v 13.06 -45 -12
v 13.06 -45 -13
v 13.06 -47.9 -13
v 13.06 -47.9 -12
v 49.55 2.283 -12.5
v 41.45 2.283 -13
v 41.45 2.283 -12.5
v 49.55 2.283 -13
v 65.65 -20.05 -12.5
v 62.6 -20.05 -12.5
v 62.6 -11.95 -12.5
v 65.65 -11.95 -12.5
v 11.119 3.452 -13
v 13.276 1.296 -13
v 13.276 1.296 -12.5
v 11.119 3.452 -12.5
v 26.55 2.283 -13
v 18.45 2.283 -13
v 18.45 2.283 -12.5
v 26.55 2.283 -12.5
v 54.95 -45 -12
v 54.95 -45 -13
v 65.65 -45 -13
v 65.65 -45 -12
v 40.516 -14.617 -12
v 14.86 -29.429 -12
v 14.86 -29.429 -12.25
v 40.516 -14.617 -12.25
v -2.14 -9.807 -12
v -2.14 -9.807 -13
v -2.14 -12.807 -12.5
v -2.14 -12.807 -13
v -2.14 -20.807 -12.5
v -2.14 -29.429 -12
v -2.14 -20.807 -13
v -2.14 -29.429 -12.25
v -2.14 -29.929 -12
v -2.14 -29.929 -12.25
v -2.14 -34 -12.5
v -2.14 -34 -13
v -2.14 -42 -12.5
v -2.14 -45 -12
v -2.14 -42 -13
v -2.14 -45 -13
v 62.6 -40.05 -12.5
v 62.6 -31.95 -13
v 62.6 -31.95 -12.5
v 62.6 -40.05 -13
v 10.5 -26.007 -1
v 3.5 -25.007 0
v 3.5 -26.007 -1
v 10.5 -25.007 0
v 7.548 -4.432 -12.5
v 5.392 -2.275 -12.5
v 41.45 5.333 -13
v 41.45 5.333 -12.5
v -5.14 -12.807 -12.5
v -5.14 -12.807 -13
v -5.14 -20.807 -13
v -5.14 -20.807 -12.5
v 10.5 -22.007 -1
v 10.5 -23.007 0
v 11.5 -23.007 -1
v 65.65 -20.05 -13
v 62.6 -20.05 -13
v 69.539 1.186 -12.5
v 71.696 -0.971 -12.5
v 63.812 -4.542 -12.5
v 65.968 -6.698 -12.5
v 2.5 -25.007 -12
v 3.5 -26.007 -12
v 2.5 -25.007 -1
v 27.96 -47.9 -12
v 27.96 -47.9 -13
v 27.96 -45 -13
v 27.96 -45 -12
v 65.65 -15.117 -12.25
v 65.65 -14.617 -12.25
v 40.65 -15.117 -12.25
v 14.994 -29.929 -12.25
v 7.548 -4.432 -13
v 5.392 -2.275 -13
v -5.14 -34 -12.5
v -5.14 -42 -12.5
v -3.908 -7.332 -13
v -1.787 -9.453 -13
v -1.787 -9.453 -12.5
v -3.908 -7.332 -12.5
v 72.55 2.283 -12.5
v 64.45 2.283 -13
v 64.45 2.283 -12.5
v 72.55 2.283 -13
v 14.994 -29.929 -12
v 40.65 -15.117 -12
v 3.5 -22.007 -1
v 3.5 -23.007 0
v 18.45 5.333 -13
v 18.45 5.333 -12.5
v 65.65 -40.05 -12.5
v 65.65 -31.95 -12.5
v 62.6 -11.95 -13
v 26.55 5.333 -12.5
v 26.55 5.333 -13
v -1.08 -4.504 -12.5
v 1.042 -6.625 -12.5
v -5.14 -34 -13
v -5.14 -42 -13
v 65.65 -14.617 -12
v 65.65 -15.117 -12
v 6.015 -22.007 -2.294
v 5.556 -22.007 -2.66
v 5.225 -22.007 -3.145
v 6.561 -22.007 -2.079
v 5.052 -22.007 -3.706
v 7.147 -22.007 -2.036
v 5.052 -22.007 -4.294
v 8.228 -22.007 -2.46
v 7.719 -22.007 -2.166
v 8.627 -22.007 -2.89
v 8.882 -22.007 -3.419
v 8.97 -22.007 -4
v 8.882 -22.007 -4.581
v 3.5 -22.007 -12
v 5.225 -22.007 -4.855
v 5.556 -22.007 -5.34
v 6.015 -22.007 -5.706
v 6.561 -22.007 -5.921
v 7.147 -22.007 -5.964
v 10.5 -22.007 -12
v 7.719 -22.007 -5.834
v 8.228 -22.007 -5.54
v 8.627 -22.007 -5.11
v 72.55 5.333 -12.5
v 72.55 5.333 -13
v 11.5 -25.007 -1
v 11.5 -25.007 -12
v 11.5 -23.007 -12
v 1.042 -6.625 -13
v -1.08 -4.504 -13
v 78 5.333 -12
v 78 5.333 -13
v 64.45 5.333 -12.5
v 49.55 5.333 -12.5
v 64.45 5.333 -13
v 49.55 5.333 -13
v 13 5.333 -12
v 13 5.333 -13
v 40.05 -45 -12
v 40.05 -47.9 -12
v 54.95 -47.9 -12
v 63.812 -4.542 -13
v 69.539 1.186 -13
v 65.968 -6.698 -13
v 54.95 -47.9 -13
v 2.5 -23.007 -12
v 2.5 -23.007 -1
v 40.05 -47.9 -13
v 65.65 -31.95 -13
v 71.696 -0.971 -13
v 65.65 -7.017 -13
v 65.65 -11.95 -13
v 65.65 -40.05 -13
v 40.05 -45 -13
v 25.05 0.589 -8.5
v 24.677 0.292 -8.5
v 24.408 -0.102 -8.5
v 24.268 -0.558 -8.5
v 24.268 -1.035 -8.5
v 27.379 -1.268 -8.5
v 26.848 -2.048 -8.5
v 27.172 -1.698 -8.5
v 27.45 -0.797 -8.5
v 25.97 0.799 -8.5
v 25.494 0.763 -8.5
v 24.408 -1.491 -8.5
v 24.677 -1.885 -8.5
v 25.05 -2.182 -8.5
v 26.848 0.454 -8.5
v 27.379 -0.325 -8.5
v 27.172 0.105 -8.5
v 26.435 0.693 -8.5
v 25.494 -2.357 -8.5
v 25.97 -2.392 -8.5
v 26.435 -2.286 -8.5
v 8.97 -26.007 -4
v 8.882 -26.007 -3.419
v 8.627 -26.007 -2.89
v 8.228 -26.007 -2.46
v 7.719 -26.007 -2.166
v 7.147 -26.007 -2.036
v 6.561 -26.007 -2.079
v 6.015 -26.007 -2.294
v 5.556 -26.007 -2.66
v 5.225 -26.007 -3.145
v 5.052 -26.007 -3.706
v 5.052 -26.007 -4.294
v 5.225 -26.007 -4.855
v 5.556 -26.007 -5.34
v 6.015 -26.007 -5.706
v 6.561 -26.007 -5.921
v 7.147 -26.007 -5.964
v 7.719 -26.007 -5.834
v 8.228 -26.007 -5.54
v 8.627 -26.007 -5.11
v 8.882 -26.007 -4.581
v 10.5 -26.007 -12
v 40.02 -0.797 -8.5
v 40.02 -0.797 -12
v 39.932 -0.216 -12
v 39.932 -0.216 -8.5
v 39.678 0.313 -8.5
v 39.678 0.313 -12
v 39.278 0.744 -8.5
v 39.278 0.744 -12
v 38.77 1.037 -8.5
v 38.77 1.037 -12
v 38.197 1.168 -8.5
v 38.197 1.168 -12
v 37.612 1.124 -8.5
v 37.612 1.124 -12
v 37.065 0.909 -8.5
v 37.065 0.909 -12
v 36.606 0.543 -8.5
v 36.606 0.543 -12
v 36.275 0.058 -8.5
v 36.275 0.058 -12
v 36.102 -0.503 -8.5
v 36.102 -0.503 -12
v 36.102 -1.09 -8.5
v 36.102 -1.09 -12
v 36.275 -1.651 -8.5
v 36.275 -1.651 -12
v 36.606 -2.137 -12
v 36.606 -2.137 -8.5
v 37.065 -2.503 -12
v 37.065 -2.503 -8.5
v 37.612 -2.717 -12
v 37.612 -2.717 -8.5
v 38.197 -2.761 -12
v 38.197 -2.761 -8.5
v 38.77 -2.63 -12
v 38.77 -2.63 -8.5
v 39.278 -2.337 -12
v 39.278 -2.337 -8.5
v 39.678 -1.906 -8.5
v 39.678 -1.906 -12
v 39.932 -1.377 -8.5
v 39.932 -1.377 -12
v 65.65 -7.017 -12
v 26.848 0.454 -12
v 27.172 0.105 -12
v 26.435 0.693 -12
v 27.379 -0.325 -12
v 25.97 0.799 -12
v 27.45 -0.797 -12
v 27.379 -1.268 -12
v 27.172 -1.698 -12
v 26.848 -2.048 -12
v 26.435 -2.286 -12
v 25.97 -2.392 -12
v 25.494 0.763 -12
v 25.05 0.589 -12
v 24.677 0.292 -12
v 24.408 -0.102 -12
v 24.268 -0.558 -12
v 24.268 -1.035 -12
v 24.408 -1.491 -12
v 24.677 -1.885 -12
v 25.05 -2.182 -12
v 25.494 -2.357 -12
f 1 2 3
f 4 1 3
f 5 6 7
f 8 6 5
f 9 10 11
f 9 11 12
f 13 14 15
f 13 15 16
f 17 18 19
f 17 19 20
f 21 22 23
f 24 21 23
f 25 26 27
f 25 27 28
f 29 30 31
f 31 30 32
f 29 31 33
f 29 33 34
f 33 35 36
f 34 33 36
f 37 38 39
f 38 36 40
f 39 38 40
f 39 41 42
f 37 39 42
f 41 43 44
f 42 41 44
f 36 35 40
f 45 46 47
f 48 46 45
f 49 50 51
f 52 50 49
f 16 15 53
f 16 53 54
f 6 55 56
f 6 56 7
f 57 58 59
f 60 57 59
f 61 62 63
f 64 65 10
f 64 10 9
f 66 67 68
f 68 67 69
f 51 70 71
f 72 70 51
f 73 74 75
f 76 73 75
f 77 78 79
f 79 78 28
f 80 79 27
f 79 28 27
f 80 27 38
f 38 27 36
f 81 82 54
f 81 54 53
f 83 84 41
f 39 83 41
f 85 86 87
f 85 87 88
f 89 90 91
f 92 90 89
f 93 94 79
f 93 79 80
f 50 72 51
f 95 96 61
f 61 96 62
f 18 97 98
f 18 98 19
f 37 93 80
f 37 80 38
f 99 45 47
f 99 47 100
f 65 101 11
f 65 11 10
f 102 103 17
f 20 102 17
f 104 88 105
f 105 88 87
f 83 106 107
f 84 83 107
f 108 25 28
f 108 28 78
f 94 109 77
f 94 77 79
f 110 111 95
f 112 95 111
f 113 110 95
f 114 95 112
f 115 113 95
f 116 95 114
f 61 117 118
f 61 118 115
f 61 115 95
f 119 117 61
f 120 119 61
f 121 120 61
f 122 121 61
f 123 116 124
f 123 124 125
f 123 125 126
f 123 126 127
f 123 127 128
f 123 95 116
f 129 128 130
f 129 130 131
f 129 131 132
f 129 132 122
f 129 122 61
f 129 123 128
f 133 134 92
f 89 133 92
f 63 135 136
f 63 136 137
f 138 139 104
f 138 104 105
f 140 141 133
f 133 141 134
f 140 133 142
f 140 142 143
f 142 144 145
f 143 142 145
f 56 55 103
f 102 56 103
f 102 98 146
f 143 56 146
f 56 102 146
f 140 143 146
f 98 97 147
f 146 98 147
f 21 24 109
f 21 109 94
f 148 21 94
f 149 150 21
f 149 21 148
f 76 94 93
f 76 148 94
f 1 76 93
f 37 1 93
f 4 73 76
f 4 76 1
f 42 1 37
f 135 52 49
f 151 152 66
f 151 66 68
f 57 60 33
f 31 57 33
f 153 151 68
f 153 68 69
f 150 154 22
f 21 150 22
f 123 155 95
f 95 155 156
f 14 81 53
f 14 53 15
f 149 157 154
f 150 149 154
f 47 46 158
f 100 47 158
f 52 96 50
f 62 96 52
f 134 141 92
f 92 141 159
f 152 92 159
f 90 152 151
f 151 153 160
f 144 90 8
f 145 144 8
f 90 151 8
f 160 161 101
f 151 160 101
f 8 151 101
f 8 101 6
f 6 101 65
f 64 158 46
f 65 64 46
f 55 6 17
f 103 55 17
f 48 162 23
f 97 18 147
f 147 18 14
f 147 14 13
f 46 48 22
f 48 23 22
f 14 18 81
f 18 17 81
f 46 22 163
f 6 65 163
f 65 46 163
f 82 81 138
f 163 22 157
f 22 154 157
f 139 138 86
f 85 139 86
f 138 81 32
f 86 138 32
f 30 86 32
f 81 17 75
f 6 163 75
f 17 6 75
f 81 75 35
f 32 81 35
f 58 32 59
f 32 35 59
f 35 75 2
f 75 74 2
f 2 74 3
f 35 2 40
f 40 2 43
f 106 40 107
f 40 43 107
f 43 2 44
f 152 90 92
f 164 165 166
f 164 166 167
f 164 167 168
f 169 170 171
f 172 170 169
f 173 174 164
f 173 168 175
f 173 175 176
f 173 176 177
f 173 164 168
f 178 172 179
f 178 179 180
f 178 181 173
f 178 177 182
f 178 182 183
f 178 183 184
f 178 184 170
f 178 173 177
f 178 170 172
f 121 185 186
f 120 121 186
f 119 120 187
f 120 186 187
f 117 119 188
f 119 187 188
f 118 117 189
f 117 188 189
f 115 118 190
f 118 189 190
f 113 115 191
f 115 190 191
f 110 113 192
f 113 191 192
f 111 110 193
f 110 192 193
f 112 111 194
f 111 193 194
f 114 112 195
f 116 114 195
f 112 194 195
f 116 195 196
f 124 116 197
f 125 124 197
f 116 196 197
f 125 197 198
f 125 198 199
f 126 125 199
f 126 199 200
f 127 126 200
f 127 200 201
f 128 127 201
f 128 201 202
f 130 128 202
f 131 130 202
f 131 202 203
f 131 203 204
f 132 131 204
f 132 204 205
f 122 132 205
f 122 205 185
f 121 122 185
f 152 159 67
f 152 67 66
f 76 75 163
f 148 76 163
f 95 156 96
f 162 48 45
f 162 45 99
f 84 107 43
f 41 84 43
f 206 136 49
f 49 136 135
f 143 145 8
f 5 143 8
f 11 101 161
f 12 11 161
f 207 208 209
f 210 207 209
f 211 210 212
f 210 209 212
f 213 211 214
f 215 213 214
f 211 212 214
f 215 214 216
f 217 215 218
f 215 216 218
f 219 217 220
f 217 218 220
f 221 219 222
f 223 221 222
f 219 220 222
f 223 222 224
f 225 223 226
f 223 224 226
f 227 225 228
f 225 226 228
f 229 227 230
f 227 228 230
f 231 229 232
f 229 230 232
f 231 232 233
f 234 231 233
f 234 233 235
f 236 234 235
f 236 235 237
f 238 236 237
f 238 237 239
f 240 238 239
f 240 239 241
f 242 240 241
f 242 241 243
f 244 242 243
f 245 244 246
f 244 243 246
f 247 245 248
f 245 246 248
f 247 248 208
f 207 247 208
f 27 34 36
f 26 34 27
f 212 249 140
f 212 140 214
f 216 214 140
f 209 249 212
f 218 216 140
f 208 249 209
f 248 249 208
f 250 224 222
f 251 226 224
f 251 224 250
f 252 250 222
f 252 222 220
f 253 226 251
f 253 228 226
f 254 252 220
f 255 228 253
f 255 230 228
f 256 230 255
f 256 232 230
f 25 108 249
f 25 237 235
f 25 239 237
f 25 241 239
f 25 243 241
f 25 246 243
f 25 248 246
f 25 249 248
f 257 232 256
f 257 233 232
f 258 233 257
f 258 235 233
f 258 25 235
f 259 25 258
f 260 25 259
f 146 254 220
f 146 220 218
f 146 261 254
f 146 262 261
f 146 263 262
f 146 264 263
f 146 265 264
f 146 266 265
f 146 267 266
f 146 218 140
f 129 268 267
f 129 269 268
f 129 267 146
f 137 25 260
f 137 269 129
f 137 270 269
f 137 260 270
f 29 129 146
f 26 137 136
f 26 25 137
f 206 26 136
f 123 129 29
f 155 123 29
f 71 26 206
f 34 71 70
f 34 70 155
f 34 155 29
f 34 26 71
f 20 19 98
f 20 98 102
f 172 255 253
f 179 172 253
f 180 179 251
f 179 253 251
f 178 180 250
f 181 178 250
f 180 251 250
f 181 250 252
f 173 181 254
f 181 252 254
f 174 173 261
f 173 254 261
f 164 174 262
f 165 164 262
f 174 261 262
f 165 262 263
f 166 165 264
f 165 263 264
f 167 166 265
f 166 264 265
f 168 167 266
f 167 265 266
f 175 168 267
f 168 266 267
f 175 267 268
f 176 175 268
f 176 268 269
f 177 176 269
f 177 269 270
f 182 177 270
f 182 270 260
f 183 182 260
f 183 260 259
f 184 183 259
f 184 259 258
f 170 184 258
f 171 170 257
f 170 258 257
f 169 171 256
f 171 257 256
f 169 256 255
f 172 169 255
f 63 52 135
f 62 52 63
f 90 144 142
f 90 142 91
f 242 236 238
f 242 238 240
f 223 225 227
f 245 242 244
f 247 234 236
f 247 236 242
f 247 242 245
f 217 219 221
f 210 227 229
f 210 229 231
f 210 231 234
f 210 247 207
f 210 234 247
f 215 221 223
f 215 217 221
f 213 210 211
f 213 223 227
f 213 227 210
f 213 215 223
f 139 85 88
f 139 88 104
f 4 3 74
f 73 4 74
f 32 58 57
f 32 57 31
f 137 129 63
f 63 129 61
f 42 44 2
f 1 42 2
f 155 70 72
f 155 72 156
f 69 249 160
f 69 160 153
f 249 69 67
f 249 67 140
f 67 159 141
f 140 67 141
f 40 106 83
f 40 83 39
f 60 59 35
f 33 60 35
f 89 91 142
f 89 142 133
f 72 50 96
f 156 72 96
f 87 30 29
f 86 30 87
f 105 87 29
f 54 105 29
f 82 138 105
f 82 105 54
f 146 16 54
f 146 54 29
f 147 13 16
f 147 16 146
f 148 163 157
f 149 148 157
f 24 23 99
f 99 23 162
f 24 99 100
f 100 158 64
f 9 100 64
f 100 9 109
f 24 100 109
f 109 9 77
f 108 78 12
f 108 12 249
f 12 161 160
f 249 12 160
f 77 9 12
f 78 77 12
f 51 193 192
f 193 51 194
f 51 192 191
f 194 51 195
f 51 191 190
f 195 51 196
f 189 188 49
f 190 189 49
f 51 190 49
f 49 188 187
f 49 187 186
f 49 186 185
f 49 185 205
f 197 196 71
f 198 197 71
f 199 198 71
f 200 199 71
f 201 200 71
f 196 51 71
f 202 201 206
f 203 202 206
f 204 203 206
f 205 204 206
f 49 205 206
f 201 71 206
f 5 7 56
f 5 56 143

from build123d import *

# Parameters (mm, degrees)
PAD033_DEPTH    = 1
SKETCH055_W     = 8.1
SKETCH055_H     = 3.05
SKETCH055_W_2   = 3.05
SKETCH055_H_2   = 8.1
POCKET022_DEPTH = 0.5
POCKET023_DEPTH = 0.25
SKETCH057_W     = 3
SKETCH057_H     = 8
PAD034_DEPTH    = 0.5
SKETCH058_R     = 1.6
SKETCH058_R_2   = 1.97
PAD035_DEPTH    = 3.5
SKETCH059_W     = 9
SKETCH059_H     = 4
PAD036_DEPTH    = 12
SKETCH060_R     = 1.97
POCKET024_DEPTH = 31.34125859
CHAMFER009_SIZE = 1


with BuildPart() as part:
    # Sketch054 (on Face2 of Binder015) → Pad033 (new body)
    with BuildSketch(Plane(origin=(0, 0, -13), x_dir=(1, 0, 0), z_dir=(0, 0, -1))):
        Polygon((65.65, 44.999997), (65.65, 7.016667), (78, -5.333333), (13, -5.333333), (3.5165956595, 4.1500713405), (-2.14025859, 9.80692559), (-2.14025859, 44.999997), (13.05974141, 44.999997), (13.05974141, 47.899997), (27.95974141, 47.899997), (27.95974141, 44.999997), (40.05, 44.999997), (40.05, 47.899997), (54.95, 47.899997), (54.95, 44.999997), align=None)
    extrude(amount=-PAD033_DEPTH)

    # Sketch055 (on Face14 of Pad033) → Pocket022 (cut)
    with BuildSketch(Plane(origin=(0, 0, -13), x_dir=(1, 0, 0), z_dir=(0, 0, -1))):
        with Locations((22.5, -3.808333)):
            Rectangle(SKETCH055_W, SKETCH055_H)
        with Locations((45.5, -3.808333)):
            Rectangle(SKETCH055_W, SKETCH055_H)
        with Locations((68.5, -3.808333)):
            Rectangle(SKETCH055_W, SKETCH055_H)
        with Locations((64.125, 15.999997)):
            Rectangle(SKETCH055_W_2, SKETCH055_H_2)
        with Locations((64.125, 35.999997)):
            Rectangle(SKETCH055_W_2, SKETCH055_H_2)
        Polygon((71.6957629791, 0.9709040209), (69.5390872965, -1.1857716618), (63.8115223689, 4.5417932658), (65.9681980515, 6.6984689485), align=None)
        Polygon((11.119095962, -3.452428962), (5.3915310344, 2.2751359656), (7.5482067171, 4.4318116482), (13.2757716447, -1.2957532794), align=None)
    extrude(amount=-POCKET022_DEPTH, mode=Mode.SUBTRACT)

    # Sketch056 (on Face10 of Pocket022) → Pocket023 (cut)
    with BuildSketch(Plane.XY.offset(-12)):
        Polygon((65.65, -15.116667), (40.65, -15.116667), (14.9937160062, -29.9293294702), (-2.14025859, -29.9293294702), (-2.14025859, -29.4293294702), (14.85974141, -29.4293294702), (40.5160254038, -14.616667), (65.65, -14.616667), align=None)
    extrude(amount=-POCKET023_DEPTH, mode=Mode.SUBTRACT)

    # Sketch057 (on Face2 of Pocket023) → Pad034 (join)
    with BuildSketch(Plane(origin=(0, 0, -13), x_dir=(1, 0, 0), z_dir=(0, 0, -1))):
        with Locations((-3.64025859, 16.80692559)):
            Rectangle(SKETCH057_W, SKETCH057_H)
        with Locations((-3.64025859, 37.999997)):
            Rectangle(SKETCH057_W, SKETCH057_H)
        Polygon((1.0417219254, 6.6249450746), (-1.7867051994, 9.4533721994), (-3.9080255429, 7.3320518558), (-1.0795984182, 4.5036247311), align=None)
    extrude(amount=-PAD034_DEPTH)

    # Sketch058 (on Face9 of Pad034) → Pad035 (join)
    with BuildSketch(Plane.XY.offset(-12)):
        with Locations((25.85, -0.796667)):
            Circle(SKETCH058_R)
        with Locations((38.05, -0.796667)):
            Circle(SKETCH058_R_2)
    extrude(amount=PAD035_DEPTH)

    # Sketch059 (on Face10 of Pad035) → Pad036 (join)
    with BuildSketch(Plane.XY.offset(-12)):
        with Locations((6.99974141, -24.00692559)):
            Rectangle(SKETCH059_W, SKETCH059_H)
    extrude(amount=PAD036_DEPTH)

    # Sketch060 (on Face57 of Pad036) → Pocket024 (cut, through all)
    with BuildSketch(Plane.XZ.offset(26.00692559)):
        with Locations((6.99974141, -4)):
            Circle(SKETCH060_R)
    extrude(amount=-POCKET024_DEPTH, mode=Mode.SUBTRACT)

    # Chamfer009
    chamfer009_edges = [part.edges().sort_by_distance(p)[0] for p in [
        (2.499741, -26.006926, -6),
        (2.499741, -22.006926, -6),
        (2.499741, -24.006926, 0),
        (6.999741, -22.006926, 0),
        (11.499741, -24.006926, 0),
        (6.999741, -26.006926, 0),
        (11.499741, -26.006926, -6),
        (11.499741, -22.006926, -6),
    ]]
    chamfer(chamfer009_edges, length=CHAMFER009_SIZE)


solid = part.part
